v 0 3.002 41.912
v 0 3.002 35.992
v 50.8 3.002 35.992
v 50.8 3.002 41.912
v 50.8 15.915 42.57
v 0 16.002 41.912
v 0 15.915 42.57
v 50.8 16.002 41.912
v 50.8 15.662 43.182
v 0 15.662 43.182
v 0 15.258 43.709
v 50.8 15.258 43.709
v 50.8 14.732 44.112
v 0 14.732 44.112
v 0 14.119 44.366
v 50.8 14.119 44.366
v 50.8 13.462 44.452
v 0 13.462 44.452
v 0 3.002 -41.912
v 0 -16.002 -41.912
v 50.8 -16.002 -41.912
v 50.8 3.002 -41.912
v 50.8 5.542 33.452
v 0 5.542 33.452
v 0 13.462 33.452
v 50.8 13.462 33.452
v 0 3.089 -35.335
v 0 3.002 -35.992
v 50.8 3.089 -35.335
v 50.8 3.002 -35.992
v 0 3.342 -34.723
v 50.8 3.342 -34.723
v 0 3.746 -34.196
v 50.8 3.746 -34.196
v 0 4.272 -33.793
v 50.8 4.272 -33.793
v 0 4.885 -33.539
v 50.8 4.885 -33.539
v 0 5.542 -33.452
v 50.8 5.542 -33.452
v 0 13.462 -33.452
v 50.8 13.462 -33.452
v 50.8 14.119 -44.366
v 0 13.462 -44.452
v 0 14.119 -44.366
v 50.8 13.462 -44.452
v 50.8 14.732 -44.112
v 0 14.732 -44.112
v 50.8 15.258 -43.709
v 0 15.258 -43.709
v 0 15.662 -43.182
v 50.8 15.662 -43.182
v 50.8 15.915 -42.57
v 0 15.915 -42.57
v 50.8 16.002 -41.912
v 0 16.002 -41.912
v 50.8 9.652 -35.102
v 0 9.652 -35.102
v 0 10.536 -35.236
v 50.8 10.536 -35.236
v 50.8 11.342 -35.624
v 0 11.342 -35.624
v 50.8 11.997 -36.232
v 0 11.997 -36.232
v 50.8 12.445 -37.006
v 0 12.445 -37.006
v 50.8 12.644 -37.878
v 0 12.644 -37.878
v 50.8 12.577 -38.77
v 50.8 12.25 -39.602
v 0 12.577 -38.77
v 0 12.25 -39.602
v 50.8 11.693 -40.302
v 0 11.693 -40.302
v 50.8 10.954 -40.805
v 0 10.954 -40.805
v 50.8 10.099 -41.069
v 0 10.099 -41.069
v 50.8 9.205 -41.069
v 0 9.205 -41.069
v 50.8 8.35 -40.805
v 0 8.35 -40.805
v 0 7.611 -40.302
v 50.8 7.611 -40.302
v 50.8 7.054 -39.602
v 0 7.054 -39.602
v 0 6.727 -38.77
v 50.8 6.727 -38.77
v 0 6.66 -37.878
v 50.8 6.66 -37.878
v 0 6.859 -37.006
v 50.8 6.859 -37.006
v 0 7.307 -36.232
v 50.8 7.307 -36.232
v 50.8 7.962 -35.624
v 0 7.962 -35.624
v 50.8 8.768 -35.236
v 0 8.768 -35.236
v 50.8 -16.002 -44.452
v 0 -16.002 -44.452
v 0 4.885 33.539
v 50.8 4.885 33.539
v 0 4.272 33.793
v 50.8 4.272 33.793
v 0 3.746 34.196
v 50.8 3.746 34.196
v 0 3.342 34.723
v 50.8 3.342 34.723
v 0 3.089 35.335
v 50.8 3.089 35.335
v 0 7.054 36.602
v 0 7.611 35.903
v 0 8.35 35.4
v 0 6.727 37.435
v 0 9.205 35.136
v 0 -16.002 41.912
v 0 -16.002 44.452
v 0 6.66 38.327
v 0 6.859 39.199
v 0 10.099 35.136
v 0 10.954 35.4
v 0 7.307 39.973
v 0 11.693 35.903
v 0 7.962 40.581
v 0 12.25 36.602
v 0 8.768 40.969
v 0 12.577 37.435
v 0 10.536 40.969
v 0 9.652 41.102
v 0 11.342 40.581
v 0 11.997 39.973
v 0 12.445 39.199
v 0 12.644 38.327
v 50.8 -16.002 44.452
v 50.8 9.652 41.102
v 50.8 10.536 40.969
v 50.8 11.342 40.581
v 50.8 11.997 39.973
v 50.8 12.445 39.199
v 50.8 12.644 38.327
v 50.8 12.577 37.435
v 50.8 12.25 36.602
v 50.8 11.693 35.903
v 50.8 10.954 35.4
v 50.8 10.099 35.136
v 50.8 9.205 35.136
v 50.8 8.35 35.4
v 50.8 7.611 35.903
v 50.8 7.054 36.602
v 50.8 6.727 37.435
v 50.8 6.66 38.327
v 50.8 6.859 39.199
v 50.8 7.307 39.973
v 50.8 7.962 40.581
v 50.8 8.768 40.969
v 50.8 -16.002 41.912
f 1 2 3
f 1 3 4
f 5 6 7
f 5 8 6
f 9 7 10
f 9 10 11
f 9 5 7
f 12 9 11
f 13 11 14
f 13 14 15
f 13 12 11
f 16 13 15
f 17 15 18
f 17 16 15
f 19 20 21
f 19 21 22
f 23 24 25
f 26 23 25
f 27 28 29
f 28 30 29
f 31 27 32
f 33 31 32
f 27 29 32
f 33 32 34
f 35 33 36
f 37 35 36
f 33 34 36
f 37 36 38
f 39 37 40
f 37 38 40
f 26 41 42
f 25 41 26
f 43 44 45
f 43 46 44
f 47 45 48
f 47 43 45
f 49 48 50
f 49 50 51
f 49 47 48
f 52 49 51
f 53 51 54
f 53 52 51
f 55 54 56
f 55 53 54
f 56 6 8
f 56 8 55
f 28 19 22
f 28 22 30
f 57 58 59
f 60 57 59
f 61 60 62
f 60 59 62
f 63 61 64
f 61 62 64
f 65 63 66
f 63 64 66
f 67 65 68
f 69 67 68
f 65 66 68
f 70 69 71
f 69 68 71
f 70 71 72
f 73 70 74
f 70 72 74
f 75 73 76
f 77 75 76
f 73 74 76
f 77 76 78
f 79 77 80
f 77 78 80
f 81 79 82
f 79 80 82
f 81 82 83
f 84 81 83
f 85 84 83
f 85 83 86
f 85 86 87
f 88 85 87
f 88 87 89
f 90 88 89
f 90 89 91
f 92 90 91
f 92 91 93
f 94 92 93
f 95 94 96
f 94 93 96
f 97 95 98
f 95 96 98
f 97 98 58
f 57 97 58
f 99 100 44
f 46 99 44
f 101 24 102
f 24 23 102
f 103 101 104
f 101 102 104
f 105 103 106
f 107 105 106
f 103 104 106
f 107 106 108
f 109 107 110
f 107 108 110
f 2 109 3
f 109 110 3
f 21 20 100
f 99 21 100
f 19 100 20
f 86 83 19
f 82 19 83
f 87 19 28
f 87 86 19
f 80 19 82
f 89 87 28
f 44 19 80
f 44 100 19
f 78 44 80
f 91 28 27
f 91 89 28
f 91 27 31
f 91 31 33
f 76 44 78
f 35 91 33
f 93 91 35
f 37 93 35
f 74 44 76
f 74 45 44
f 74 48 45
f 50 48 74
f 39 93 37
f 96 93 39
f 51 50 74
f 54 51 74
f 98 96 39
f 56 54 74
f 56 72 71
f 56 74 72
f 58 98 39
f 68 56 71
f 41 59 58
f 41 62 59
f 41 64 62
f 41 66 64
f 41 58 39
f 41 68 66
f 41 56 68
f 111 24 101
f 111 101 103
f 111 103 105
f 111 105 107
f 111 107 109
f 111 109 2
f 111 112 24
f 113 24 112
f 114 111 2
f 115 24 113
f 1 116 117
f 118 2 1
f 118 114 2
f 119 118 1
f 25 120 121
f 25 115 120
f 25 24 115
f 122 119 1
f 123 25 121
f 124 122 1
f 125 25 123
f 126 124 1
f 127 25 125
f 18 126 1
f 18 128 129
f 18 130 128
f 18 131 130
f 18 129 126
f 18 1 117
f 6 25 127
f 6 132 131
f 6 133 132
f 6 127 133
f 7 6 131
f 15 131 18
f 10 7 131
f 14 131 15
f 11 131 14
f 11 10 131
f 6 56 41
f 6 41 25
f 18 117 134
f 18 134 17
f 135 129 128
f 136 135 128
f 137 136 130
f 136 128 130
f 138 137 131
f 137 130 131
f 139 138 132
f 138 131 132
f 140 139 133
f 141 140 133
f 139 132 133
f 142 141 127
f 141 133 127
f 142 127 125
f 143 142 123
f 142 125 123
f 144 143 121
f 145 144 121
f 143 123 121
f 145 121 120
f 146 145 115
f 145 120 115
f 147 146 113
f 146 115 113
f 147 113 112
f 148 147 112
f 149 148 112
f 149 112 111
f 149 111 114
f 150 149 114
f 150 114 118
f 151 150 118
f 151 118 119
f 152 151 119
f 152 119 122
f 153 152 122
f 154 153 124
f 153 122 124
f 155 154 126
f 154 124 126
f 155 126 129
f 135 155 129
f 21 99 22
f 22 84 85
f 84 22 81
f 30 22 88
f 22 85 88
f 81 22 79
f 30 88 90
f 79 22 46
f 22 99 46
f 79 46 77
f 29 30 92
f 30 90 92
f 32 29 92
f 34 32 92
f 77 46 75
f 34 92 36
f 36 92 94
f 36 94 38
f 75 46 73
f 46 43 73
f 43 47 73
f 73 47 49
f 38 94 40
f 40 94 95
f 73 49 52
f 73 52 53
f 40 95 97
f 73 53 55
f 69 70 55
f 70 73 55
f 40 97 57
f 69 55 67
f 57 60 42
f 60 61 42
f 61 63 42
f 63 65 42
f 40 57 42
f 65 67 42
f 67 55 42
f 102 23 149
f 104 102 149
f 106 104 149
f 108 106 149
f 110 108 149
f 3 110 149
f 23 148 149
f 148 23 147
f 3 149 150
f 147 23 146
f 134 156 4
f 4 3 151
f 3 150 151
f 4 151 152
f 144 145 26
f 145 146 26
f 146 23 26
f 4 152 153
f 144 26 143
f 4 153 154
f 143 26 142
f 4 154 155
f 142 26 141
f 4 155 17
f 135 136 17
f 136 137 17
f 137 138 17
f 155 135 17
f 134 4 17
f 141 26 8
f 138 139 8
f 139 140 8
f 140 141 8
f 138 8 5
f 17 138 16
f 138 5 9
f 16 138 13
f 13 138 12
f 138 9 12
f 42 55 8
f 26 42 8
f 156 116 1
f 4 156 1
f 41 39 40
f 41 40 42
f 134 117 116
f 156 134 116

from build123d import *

# Parameters (mm, degrees)
SKETCH1_W           = 88.905
SKETCH1_H           = 32.004
BOSS_EXTRUDE1_DEPTH = 50.8
FILLET1_R           = 2.54
FILLET2_R           = 2.54
SKETCH13_W          = 83.825
SKETCH13_H          = 29.464
CUT_EXTRUDE1_DEPTH  = 90
SKETCH15_W          = 8.46
SKETCH15_H          = 10.46
SKETCH15_R          = 3
BOSS_EXTRUDE8_DEPTH = 50.8
SKETCH19_W          = 8.46
SKETCH19_H          = 10.46
SKETCH19_R          = 3
BOSS_EXTRUDE9_DEPTH = 50.8
FILLET3_R           = 2.54


with BuildPart() as part:
    # Sketch1 → Boss-Extrude1 (new body)
    with BuildSketch(Plane(origin=(0, 0, 0), x_dir=(0, 0, -1), z_dir=(1, 0, 0))):
        Rectangle(SKETCH1_W, SKETCH1_H)
    extrude(amount=BOSS_EXTRUDE1_DEPTH)

    # Fillet1
    fillet1_edges = [part.edges().sort_by_distance(p)[0] for p in [
        (25.4, 16.002, -44.4525),
    ]]
    fillet(fillet1_edges, radius=FILLET1_R)

    # Fillet2
    fillet2_edges = [part.edges().sort_by_distance(p)[0] for p in [
        (25.4, 16.002, 44.4525),
    ]]
    fillet(fillet2_edges, radius=FILLET2_R)

    # Sketch13 → Cut-Extrude1 (cut)
    with BuildSketch(Plane.ZY):
        with Locations((0, -1.27)):
            Rectangle(SKETCH13_W, SKETCH13_H)
    extrude(amount=-CUT_EXTRUDE1_DEPTH, mode=Mode.SUBTRACT)

    # Sketch15 → Boss-Extrude8 (add)
    with BuildSketch(Plane.ZY):
        with Locations((37.6825, 8.232)):
            Rectangle(SKETCH15_W, SKETCH15_H)
        with Locations((38.1025, 9.652)):
            Circle(SKETCH15_R, mode=Mode.SUBTRACT)
    extrude(amount=-BOSS_EXTRUDE8_DEPTH)

    # Sketch19 → Boss-Extrude9 (add)
    with BuildSketch(Plane.ZY):
        with Locations((-37.6825, 8.232)):
            Rectangle(SKETCH19_W, SKETCH19_H)
        with Locations((-38.1025, 9.652)):
            Circle(SKETCH19_R, mode=Mode.SUBTRACT)
    extrude(amount=-BOSS_EXTRUDE9_DEPTH)

    # Fillet3
    fillet3_edges = [part.edges().sort_by_distance(p)[0] for p in [
        (25.4, 3.002, 33.4525),
        (25.4, 3.002, -33.4525),
    ]]
    fillet(fillet3_edges, radius=FILLET3_R)


solid = part.part
